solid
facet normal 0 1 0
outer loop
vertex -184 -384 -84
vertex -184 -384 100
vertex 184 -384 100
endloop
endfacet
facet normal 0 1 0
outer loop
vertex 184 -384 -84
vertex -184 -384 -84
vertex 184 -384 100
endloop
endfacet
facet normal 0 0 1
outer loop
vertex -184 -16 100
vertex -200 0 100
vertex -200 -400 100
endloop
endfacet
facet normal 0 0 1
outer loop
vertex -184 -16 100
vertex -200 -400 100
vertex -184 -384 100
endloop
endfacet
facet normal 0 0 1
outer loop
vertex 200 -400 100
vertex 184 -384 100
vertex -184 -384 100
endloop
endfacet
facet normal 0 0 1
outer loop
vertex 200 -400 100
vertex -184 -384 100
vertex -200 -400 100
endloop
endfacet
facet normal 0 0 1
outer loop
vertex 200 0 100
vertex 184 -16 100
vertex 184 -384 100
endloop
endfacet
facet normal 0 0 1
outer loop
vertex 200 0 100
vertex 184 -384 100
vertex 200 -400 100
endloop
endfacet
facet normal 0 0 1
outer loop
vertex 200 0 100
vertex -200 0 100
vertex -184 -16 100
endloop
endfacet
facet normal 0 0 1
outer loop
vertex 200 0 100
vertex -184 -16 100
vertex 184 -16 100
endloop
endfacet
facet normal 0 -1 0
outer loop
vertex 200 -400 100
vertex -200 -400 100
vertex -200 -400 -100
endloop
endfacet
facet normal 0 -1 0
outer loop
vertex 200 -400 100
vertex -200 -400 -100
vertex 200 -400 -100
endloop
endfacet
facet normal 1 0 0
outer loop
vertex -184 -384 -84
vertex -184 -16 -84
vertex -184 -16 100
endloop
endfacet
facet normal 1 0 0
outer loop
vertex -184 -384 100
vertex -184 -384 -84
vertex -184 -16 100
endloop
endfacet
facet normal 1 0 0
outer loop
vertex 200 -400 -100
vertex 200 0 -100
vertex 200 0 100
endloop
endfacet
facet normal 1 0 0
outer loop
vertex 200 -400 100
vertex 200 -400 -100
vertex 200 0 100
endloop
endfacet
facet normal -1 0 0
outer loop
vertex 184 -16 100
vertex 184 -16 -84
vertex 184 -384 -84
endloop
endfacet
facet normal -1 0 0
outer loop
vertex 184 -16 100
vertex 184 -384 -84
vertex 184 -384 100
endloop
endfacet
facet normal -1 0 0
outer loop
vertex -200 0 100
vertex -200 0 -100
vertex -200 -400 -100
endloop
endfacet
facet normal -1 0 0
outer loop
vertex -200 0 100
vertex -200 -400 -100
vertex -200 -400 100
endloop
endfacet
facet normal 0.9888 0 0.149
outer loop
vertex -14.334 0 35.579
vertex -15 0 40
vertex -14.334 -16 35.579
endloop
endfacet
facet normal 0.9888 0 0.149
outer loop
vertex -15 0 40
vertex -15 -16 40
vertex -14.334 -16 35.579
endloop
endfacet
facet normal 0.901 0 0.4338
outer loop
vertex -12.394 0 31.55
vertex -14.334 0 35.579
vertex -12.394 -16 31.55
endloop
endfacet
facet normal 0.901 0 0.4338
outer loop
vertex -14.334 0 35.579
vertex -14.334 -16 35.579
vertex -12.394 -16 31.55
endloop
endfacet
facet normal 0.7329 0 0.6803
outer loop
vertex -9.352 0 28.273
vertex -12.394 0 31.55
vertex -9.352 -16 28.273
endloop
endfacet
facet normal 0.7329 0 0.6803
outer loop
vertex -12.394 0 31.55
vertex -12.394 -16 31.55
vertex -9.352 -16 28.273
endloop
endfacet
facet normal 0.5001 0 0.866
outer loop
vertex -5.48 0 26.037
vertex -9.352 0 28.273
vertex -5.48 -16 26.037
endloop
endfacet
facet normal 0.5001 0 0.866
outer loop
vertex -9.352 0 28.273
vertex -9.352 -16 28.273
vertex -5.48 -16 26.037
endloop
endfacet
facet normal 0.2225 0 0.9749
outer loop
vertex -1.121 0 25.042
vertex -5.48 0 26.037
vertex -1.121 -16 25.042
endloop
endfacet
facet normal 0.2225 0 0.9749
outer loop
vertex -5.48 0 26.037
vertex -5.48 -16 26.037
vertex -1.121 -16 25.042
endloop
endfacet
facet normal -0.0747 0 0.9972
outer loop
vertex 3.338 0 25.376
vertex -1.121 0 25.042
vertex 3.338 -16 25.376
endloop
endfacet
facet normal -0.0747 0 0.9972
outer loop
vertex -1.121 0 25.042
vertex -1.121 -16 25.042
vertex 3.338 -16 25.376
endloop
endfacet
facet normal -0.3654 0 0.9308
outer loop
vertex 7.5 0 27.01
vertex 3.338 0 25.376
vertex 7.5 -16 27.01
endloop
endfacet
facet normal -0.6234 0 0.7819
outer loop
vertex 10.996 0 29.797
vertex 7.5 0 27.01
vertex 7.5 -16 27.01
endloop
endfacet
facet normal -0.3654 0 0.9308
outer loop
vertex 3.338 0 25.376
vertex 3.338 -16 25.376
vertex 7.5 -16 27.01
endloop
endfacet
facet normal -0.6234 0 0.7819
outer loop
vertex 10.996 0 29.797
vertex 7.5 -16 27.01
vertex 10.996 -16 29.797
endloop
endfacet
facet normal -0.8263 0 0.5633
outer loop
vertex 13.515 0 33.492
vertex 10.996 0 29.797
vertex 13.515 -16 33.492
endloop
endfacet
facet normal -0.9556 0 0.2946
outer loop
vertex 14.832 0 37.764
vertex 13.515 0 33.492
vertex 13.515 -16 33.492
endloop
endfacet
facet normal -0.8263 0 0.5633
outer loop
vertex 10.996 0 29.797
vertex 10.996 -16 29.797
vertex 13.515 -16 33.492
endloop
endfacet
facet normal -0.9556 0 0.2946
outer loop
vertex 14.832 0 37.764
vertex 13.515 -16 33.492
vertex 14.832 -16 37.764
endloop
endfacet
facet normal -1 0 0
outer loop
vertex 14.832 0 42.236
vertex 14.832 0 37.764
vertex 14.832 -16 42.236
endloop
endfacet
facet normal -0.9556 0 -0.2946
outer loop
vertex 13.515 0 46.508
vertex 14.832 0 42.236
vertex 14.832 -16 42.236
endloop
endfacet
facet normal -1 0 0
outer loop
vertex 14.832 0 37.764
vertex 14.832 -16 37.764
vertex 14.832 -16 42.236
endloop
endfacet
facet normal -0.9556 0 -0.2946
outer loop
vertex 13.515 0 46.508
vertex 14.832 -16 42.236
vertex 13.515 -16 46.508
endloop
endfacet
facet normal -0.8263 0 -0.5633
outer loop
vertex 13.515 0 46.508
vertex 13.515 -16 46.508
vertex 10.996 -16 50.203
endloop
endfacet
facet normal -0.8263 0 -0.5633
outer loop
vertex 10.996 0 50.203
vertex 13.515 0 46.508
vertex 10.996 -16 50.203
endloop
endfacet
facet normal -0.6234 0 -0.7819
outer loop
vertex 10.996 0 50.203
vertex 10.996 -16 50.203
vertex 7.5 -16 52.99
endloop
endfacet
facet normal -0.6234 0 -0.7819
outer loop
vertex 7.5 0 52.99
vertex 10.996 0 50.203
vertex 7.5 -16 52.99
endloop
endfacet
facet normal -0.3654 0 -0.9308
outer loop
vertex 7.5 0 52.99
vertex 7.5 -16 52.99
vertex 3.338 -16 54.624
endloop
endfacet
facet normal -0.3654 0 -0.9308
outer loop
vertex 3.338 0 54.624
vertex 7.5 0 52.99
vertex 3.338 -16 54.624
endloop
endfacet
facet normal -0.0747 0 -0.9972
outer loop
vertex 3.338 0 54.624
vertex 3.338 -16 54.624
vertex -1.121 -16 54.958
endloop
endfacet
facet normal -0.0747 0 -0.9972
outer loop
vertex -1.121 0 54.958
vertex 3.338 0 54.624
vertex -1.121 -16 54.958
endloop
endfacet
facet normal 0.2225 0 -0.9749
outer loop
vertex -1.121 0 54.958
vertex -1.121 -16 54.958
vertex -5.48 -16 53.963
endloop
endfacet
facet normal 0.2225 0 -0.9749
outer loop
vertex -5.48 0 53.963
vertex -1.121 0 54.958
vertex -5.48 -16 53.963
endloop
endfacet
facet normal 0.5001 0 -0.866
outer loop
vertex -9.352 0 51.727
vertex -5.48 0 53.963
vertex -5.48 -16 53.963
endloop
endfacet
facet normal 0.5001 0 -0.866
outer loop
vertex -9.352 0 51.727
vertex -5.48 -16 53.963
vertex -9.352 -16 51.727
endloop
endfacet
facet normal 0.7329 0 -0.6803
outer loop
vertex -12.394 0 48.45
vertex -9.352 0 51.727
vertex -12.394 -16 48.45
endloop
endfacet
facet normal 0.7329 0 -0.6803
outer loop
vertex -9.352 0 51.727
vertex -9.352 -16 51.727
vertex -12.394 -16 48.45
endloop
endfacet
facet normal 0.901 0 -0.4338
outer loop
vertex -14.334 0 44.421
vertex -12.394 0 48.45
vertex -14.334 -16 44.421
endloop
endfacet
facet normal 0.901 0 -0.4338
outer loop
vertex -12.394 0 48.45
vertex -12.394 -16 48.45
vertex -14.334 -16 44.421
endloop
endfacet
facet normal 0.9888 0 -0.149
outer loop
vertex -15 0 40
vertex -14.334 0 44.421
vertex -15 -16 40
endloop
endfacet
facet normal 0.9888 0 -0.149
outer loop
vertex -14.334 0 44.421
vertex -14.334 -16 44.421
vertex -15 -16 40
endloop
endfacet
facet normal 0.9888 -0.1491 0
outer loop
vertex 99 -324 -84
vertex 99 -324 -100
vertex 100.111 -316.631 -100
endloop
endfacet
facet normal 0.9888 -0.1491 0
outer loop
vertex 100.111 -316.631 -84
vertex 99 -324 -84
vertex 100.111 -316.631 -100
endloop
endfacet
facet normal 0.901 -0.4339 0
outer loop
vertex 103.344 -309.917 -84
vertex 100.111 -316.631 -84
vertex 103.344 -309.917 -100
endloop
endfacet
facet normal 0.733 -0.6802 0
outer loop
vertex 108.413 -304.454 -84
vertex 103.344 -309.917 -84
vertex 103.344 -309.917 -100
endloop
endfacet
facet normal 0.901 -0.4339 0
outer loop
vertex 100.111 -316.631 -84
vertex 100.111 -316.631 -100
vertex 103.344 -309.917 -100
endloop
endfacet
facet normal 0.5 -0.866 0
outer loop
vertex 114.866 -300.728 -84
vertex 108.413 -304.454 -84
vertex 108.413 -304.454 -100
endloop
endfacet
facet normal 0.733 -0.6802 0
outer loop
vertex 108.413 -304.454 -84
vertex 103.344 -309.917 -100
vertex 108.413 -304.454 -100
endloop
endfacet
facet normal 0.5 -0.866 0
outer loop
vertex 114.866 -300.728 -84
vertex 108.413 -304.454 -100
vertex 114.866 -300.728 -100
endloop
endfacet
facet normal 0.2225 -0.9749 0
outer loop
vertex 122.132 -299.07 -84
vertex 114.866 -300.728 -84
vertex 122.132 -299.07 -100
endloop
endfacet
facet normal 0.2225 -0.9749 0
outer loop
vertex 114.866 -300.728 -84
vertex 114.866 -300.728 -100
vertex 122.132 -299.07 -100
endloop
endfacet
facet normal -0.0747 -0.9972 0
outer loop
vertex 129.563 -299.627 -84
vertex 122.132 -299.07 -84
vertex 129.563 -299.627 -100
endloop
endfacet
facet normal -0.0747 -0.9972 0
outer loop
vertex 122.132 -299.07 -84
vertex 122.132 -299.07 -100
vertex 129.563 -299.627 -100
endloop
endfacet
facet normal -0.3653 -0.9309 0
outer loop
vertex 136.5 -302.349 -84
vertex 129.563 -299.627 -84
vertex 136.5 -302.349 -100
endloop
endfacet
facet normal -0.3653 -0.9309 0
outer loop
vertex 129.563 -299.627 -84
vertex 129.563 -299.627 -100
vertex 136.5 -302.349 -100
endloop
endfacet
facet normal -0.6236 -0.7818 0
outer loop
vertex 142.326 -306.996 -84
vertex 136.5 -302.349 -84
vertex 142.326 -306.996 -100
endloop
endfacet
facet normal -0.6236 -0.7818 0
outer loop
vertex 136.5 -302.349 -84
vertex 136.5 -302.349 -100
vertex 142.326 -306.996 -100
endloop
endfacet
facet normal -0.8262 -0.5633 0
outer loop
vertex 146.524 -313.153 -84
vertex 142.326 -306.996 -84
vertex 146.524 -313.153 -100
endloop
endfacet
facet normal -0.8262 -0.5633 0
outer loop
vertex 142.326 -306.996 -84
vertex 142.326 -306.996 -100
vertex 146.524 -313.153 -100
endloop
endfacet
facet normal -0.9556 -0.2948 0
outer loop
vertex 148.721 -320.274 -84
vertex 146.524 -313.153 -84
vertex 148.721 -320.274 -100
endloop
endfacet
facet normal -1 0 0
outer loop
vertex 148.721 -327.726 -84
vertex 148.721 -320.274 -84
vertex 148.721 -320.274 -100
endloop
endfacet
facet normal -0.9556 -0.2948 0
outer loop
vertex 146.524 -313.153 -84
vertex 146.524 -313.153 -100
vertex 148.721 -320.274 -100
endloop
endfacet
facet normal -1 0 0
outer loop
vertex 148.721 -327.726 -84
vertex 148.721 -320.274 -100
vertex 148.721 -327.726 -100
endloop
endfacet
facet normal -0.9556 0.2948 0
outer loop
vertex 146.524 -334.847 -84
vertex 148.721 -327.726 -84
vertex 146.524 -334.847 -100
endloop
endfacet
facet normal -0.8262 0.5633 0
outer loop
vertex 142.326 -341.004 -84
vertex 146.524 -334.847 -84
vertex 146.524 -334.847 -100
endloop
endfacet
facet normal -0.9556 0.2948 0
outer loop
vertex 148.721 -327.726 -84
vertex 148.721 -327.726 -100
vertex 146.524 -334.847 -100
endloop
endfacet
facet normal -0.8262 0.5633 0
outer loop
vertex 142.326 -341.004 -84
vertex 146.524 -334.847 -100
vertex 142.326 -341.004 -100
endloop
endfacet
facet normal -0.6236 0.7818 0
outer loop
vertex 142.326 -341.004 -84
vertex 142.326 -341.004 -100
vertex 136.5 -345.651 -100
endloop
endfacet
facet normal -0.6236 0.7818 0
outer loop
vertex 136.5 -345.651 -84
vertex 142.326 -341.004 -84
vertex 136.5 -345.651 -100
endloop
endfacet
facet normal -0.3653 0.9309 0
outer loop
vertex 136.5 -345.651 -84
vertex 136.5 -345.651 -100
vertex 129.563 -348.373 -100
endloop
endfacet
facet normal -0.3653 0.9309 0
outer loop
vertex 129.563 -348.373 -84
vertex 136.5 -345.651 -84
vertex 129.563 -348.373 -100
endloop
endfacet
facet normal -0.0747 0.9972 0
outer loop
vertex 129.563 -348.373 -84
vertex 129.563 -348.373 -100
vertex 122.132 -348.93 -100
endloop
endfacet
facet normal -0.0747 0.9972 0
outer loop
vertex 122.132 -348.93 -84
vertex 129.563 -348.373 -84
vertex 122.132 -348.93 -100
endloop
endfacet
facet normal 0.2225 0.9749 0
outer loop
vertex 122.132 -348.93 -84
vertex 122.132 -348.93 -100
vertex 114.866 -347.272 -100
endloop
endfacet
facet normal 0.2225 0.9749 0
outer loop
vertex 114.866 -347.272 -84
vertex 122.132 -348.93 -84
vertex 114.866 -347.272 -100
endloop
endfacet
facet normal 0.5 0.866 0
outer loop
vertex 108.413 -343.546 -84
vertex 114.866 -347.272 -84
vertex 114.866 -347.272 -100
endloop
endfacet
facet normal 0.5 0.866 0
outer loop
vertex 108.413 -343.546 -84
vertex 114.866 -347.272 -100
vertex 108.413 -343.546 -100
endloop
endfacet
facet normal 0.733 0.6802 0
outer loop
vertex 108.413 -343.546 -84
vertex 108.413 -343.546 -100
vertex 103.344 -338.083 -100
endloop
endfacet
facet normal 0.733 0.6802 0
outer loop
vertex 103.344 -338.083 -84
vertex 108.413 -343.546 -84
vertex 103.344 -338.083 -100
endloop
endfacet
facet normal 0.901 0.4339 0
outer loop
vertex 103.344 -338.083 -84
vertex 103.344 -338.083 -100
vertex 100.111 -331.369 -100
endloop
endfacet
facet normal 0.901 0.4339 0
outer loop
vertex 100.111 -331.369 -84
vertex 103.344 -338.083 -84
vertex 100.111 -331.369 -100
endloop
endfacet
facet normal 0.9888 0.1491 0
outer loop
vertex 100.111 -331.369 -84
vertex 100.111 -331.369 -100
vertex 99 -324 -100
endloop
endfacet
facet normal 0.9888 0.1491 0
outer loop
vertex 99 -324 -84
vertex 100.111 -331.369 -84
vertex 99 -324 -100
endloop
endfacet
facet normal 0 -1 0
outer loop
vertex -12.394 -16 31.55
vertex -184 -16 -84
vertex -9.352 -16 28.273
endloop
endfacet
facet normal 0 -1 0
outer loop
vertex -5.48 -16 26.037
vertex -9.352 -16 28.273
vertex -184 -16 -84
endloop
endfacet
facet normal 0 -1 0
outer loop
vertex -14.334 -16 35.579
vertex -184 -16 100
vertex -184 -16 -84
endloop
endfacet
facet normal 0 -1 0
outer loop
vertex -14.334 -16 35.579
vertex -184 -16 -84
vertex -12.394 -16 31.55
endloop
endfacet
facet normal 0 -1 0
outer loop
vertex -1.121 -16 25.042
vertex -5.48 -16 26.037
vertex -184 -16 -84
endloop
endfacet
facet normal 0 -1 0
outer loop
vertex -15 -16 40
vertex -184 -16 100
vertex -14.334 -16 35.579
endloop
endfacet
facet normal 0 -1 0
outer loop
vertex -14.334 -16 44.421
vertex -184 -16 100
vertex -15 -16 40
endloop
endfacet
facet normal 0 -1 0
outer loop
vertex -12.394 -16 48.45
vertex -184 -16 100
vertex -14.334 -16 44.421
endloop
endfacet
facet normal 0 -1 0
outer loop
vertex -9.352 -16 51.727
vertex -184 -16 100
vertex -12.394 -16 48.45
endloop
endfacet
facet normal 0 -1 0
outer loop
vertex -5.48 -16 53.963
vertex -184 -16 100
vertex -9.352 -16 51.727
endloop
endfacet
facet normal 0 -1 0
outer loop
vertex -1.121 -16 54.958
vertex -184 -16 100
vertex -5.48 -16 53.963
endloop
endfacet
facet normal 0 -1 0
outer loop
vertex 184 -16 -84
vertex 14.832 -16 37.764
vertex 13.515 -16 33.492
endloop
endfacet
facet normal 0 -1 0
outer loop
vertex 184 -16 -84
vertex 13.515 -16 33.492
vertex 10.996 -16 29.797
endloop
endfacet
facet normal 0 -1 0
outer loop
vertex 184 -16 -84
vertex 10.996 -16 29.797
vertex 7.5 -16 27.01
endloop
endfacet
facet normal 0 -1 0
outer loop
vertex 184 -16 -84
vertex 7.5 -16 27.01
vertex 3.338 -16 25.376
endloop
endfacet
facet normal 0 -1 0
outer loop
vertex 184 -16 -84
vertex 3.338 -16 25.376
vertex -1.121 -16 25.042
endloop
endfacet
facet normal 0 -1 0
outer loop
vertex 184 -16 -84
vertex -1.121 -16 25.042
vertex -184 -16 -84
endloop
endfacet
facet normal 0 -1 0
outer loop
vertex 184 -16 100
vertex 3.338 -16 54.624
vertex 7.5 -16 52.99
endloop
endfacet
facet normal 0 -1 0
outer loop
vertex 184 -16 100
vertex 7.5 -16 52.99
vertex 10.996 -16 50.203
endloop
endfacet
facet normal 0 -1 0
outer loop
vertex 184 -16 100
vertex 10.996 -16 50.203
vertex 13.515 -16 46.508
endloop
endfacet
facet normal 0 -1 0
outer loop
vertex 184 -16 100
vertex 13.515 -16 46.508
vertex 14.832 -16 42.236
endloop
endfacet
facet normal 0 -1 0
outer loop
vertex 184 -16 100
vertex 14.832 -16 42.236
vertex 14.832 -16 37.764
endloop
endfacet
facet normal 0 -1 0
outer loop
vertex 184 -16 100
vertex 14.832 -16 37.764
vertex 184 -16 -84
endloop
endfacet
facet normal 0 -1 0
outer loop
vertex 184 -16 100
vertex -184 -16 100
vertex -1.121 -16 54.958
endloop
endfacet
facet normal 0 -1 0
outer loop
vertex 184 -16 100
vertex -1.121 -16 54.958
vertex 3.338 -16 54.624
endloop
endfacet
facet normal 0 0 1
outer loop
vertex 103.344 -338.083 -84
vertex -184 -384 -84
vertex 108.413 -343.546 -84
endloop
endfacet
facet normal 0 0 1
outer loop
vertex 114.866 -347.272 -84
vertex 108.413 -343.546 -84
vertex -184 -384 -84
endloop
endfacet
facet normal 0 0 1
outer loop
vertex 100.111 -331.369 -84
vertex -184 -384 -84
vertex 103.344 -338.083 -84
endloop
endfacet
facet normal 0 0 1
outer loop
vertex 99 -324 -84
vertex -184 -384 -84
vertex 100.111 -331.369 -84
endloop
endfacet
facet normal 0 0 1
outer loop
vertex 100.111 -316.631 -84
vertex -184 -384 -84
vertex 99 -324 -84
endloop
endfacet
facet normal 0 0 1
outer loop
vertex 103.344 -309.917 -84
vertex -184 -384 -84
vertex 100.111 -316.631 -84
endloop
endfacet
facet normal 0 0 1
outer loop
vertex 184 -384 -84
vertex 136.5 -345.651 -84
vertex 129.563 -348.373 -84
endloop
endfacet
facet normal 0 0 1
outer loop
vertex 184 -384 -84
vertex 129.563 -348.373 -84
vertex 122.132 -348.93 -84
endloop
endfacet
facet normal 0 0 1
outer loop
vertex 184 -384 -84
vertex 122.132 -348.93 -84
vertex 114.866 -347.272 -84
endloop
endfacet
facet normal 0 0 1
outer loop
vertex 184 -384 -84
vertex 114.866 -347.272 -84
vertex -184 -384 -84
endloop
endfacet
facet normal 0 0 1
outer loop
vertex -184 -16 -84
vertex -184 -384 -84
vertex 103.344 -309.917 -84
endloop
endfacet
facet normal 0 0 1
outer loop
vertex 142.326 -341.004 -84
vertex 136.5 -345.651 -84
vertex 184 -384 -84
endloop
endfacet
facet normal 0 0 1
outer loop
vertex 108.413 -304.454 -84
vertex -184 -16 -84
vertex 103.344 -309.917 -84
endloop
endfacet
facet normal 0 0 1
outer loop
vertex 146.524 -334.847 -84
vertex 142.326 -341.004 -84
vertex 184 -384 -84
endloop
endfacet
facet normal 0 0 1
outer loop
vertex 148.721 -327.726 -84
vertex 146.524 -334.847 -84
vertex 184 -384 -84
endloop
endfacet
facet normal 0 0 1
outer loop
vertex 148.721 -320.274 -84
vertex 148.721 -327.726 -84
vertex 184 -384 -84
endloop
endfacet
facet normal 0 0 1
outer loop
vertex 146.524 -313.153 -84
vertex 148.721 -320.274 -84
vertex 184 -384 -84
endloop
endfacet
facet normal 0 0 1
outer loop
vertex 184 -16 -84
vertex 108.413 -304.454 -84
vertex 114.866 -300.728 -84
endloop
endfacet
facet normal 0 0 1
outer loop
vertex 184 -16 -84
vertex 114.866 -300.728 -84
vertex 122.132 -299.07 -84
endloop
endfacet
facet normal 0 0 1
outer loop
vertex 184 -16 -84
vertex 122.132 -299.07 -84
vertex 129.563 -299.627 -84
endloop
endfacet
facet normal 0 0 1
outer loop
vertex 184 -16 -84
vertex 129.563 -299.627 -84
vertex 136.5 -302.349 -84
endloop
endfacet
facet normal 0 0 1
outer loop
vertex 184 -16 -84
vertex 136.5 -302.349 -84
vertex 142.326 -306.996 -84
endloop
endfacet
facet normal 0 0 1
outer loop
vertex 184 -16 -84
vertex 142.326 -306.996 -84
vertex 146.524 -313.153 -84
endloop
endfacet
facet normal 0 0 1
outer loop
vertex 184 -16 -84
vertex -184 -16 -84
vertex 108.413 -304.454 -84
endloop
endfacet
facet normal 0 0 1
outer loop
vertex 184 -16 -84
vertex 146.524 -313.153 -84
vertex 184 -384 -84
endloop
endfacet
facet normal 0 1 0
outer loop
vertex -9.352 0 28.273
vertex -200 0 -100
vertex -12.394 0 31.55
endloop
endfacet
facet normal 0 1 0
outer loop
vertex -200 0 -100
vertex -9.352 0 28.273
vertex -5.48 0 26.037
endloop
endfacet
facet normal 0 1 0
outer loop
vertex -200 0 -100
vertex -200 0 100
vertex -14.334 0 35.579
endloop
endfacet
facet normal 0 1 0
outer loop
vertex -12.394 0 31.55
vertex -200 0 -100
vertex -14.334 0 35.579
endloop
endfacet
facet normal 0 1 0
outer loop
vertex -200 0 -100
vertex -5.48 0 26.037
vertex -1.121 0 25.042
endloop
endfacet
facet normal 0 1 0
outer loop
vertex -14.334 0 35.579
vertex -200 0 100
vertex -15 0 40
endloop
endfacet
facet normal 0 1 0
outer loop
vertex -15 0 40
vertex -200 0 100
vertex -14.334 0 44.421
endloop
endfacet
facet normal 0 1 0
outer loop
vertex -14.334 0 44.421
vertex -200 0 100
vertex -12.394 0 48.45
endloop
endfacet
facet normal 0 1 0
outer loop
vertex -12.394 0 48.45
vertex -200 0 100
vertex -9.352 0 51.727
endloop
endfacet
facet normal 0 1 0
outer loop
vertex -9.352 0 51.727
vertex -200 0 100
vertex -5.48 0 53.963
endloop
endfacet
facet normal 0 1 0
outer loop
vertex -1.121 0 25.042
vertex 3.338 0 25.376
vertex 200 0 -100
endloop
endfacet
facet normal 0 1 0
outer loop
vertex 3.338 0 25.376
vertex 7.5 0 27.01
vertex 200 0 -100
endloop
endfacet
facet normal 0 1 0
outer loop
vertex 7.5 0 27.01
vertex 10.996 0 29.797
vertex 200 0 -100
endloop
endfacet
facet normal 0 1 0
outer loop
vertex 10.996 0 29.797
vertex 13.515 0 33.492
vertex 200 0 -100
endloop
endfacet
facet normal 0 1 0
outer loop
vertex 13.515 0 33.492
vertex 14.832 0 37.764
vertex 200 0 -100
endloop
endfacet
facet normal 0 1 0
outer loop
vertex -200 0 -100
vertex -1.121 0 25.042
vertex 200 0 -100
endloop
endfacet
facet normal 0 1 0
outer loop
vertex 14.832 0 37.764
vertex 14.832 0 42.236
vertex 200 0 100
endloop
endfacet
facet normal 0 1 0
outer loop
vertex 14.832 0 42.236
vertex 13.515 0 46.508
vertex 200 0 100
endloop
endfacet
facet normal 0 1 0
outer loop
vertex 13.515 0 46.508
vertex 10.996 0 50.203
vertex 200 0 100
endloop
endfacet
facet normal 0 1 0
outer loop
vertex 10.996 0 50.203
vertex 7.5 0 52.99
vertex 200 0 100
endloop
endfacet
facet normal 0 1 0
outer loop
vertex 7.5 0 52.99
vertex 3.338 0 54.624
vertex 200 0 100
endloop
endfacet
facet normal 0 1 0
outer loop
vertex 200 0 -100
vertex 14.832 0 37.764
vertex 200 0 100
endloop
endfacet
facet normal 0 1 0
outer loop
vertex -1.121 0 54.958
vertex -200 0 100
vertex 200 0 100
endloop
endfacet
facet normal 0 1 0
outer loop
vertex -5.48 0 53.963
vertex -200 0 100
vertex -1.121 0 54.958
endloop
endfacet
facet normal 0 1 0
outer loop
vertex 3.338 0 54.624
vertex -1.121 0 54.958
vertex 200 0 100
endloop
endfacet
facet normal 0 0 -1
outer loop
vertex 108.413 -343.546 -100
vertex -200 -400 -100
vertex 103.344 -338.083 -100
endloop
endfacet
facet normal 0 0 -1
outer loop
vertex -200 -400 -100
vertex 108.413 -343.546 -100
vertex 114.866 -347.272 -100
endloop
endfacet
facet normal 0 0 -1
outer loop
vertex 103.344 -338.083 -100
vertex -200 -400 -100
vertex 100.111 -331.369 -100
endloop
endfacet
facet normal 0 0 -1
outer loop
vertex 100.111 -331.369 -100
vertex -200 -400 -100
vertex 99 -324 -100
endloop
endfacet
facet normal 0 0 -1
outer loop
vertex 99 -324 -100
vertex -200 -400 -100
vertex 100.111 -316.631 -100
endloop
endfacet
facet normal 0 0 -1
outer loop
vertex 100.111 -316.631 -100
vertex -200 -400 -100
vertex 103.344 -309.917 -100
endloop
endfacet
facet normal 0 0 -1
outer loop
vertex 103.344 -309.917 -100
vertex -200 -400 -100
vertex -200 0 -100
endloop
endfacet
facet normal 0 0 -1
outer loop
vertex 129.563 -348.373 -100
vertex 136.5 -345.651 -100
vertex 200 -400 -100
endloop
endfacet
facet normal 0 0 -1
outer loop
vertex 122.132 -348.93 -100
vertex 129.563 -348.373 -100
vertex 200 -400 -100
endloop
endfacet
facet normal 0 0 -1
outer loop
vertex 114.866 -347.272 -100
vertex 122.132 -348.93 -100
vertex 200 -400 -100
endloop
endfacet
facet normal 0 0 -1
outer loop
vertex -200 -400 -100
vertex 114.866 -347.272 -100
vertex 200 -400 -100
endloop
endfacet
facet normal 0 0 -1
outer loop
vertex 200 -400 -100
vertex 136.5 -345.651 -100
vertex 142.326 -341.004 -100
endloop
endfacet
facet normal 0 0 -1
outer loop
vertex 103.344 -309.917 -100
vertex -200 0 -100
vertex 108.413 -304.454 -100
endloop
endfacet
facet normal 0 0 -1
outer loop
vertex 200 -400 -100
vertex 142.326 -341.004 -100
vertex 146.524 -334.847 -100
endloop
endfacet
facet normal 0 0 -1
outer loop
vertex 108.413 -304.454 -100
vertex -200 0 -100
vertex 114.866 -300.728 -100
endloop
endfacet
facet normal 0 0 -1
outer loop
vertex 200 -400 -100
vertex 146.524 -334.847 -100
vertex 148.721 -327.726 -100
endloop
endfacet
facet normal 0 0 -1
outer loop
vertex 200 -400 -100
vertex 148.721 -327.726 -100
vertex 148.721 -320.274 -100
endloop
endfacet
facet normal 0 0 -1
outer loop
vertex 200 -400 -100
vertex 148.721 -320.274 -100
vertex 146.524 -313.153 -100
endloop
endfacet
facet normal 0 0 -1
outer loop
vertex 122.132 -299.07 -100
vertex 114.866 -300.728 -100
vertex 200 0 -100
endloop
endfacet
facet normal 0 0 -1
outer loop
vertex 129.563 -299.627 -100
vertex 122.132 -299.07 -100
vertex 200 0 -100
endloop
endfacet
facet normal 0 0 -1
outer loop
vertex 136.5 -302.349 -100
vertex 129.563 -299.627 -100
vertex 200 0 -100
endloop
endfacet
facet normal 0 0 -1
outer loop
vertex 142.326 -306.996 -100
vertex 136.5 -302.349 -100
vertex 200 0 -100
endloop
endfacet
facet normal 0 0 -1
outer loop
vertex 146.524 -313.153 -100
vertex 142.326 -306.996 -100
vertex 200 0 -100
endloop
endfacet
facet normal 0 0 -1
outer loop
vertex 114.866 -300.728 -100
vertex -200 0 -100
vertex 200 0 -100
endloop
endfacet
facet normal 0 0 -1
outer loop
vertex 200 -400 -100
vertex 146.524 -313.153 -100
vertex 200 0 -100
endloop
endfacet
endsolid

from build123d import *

# Parameters (mm, degrees)
F0_W     = 400
F0_H     = 200
F1_DEPTH = 400
F2_T     = -16
F3_D     = 30
F3_DEPTH = 16
F3_TIP   = 9.0129092854
F5_D     = 50


with BuildPart() as f1:
    # F0 (on Front) → F1 (new body)
    with BuildSketch(Plane.XZ):
        Rectangle(F0_W, F0_H)
    extrude(amount=F1_DEPTH)

    # F2
    f2_openings = [f1.faces().sort_by_distance(p)[0] for p in [
        (0, -200, 100),
    ]]
    offset(amount=F2_T, openings=f2_openings)

    # F3
    with Locations(Plane(origin=(0, 0, 0), x_dir=(1, 0, 0), z_dir=(0, 1, 0))):
        with Locations((0, -40)):
            Hole(F3_D / 2, depth=F3_DEPTH)
            with Locations((0, 0, -(F3_DEPTH + F3_TIP / 2))):  # 118° drill point
                Cone(0, F3_D / 2, F3_TIP, mode=Mode.SUBTRACT)

    # F5 (through all)
    with Locations(Plane.XY.offset(-84)):
        with Locations((124, -324)):
            Hole(F5_D / 2)


solid = f1.part
